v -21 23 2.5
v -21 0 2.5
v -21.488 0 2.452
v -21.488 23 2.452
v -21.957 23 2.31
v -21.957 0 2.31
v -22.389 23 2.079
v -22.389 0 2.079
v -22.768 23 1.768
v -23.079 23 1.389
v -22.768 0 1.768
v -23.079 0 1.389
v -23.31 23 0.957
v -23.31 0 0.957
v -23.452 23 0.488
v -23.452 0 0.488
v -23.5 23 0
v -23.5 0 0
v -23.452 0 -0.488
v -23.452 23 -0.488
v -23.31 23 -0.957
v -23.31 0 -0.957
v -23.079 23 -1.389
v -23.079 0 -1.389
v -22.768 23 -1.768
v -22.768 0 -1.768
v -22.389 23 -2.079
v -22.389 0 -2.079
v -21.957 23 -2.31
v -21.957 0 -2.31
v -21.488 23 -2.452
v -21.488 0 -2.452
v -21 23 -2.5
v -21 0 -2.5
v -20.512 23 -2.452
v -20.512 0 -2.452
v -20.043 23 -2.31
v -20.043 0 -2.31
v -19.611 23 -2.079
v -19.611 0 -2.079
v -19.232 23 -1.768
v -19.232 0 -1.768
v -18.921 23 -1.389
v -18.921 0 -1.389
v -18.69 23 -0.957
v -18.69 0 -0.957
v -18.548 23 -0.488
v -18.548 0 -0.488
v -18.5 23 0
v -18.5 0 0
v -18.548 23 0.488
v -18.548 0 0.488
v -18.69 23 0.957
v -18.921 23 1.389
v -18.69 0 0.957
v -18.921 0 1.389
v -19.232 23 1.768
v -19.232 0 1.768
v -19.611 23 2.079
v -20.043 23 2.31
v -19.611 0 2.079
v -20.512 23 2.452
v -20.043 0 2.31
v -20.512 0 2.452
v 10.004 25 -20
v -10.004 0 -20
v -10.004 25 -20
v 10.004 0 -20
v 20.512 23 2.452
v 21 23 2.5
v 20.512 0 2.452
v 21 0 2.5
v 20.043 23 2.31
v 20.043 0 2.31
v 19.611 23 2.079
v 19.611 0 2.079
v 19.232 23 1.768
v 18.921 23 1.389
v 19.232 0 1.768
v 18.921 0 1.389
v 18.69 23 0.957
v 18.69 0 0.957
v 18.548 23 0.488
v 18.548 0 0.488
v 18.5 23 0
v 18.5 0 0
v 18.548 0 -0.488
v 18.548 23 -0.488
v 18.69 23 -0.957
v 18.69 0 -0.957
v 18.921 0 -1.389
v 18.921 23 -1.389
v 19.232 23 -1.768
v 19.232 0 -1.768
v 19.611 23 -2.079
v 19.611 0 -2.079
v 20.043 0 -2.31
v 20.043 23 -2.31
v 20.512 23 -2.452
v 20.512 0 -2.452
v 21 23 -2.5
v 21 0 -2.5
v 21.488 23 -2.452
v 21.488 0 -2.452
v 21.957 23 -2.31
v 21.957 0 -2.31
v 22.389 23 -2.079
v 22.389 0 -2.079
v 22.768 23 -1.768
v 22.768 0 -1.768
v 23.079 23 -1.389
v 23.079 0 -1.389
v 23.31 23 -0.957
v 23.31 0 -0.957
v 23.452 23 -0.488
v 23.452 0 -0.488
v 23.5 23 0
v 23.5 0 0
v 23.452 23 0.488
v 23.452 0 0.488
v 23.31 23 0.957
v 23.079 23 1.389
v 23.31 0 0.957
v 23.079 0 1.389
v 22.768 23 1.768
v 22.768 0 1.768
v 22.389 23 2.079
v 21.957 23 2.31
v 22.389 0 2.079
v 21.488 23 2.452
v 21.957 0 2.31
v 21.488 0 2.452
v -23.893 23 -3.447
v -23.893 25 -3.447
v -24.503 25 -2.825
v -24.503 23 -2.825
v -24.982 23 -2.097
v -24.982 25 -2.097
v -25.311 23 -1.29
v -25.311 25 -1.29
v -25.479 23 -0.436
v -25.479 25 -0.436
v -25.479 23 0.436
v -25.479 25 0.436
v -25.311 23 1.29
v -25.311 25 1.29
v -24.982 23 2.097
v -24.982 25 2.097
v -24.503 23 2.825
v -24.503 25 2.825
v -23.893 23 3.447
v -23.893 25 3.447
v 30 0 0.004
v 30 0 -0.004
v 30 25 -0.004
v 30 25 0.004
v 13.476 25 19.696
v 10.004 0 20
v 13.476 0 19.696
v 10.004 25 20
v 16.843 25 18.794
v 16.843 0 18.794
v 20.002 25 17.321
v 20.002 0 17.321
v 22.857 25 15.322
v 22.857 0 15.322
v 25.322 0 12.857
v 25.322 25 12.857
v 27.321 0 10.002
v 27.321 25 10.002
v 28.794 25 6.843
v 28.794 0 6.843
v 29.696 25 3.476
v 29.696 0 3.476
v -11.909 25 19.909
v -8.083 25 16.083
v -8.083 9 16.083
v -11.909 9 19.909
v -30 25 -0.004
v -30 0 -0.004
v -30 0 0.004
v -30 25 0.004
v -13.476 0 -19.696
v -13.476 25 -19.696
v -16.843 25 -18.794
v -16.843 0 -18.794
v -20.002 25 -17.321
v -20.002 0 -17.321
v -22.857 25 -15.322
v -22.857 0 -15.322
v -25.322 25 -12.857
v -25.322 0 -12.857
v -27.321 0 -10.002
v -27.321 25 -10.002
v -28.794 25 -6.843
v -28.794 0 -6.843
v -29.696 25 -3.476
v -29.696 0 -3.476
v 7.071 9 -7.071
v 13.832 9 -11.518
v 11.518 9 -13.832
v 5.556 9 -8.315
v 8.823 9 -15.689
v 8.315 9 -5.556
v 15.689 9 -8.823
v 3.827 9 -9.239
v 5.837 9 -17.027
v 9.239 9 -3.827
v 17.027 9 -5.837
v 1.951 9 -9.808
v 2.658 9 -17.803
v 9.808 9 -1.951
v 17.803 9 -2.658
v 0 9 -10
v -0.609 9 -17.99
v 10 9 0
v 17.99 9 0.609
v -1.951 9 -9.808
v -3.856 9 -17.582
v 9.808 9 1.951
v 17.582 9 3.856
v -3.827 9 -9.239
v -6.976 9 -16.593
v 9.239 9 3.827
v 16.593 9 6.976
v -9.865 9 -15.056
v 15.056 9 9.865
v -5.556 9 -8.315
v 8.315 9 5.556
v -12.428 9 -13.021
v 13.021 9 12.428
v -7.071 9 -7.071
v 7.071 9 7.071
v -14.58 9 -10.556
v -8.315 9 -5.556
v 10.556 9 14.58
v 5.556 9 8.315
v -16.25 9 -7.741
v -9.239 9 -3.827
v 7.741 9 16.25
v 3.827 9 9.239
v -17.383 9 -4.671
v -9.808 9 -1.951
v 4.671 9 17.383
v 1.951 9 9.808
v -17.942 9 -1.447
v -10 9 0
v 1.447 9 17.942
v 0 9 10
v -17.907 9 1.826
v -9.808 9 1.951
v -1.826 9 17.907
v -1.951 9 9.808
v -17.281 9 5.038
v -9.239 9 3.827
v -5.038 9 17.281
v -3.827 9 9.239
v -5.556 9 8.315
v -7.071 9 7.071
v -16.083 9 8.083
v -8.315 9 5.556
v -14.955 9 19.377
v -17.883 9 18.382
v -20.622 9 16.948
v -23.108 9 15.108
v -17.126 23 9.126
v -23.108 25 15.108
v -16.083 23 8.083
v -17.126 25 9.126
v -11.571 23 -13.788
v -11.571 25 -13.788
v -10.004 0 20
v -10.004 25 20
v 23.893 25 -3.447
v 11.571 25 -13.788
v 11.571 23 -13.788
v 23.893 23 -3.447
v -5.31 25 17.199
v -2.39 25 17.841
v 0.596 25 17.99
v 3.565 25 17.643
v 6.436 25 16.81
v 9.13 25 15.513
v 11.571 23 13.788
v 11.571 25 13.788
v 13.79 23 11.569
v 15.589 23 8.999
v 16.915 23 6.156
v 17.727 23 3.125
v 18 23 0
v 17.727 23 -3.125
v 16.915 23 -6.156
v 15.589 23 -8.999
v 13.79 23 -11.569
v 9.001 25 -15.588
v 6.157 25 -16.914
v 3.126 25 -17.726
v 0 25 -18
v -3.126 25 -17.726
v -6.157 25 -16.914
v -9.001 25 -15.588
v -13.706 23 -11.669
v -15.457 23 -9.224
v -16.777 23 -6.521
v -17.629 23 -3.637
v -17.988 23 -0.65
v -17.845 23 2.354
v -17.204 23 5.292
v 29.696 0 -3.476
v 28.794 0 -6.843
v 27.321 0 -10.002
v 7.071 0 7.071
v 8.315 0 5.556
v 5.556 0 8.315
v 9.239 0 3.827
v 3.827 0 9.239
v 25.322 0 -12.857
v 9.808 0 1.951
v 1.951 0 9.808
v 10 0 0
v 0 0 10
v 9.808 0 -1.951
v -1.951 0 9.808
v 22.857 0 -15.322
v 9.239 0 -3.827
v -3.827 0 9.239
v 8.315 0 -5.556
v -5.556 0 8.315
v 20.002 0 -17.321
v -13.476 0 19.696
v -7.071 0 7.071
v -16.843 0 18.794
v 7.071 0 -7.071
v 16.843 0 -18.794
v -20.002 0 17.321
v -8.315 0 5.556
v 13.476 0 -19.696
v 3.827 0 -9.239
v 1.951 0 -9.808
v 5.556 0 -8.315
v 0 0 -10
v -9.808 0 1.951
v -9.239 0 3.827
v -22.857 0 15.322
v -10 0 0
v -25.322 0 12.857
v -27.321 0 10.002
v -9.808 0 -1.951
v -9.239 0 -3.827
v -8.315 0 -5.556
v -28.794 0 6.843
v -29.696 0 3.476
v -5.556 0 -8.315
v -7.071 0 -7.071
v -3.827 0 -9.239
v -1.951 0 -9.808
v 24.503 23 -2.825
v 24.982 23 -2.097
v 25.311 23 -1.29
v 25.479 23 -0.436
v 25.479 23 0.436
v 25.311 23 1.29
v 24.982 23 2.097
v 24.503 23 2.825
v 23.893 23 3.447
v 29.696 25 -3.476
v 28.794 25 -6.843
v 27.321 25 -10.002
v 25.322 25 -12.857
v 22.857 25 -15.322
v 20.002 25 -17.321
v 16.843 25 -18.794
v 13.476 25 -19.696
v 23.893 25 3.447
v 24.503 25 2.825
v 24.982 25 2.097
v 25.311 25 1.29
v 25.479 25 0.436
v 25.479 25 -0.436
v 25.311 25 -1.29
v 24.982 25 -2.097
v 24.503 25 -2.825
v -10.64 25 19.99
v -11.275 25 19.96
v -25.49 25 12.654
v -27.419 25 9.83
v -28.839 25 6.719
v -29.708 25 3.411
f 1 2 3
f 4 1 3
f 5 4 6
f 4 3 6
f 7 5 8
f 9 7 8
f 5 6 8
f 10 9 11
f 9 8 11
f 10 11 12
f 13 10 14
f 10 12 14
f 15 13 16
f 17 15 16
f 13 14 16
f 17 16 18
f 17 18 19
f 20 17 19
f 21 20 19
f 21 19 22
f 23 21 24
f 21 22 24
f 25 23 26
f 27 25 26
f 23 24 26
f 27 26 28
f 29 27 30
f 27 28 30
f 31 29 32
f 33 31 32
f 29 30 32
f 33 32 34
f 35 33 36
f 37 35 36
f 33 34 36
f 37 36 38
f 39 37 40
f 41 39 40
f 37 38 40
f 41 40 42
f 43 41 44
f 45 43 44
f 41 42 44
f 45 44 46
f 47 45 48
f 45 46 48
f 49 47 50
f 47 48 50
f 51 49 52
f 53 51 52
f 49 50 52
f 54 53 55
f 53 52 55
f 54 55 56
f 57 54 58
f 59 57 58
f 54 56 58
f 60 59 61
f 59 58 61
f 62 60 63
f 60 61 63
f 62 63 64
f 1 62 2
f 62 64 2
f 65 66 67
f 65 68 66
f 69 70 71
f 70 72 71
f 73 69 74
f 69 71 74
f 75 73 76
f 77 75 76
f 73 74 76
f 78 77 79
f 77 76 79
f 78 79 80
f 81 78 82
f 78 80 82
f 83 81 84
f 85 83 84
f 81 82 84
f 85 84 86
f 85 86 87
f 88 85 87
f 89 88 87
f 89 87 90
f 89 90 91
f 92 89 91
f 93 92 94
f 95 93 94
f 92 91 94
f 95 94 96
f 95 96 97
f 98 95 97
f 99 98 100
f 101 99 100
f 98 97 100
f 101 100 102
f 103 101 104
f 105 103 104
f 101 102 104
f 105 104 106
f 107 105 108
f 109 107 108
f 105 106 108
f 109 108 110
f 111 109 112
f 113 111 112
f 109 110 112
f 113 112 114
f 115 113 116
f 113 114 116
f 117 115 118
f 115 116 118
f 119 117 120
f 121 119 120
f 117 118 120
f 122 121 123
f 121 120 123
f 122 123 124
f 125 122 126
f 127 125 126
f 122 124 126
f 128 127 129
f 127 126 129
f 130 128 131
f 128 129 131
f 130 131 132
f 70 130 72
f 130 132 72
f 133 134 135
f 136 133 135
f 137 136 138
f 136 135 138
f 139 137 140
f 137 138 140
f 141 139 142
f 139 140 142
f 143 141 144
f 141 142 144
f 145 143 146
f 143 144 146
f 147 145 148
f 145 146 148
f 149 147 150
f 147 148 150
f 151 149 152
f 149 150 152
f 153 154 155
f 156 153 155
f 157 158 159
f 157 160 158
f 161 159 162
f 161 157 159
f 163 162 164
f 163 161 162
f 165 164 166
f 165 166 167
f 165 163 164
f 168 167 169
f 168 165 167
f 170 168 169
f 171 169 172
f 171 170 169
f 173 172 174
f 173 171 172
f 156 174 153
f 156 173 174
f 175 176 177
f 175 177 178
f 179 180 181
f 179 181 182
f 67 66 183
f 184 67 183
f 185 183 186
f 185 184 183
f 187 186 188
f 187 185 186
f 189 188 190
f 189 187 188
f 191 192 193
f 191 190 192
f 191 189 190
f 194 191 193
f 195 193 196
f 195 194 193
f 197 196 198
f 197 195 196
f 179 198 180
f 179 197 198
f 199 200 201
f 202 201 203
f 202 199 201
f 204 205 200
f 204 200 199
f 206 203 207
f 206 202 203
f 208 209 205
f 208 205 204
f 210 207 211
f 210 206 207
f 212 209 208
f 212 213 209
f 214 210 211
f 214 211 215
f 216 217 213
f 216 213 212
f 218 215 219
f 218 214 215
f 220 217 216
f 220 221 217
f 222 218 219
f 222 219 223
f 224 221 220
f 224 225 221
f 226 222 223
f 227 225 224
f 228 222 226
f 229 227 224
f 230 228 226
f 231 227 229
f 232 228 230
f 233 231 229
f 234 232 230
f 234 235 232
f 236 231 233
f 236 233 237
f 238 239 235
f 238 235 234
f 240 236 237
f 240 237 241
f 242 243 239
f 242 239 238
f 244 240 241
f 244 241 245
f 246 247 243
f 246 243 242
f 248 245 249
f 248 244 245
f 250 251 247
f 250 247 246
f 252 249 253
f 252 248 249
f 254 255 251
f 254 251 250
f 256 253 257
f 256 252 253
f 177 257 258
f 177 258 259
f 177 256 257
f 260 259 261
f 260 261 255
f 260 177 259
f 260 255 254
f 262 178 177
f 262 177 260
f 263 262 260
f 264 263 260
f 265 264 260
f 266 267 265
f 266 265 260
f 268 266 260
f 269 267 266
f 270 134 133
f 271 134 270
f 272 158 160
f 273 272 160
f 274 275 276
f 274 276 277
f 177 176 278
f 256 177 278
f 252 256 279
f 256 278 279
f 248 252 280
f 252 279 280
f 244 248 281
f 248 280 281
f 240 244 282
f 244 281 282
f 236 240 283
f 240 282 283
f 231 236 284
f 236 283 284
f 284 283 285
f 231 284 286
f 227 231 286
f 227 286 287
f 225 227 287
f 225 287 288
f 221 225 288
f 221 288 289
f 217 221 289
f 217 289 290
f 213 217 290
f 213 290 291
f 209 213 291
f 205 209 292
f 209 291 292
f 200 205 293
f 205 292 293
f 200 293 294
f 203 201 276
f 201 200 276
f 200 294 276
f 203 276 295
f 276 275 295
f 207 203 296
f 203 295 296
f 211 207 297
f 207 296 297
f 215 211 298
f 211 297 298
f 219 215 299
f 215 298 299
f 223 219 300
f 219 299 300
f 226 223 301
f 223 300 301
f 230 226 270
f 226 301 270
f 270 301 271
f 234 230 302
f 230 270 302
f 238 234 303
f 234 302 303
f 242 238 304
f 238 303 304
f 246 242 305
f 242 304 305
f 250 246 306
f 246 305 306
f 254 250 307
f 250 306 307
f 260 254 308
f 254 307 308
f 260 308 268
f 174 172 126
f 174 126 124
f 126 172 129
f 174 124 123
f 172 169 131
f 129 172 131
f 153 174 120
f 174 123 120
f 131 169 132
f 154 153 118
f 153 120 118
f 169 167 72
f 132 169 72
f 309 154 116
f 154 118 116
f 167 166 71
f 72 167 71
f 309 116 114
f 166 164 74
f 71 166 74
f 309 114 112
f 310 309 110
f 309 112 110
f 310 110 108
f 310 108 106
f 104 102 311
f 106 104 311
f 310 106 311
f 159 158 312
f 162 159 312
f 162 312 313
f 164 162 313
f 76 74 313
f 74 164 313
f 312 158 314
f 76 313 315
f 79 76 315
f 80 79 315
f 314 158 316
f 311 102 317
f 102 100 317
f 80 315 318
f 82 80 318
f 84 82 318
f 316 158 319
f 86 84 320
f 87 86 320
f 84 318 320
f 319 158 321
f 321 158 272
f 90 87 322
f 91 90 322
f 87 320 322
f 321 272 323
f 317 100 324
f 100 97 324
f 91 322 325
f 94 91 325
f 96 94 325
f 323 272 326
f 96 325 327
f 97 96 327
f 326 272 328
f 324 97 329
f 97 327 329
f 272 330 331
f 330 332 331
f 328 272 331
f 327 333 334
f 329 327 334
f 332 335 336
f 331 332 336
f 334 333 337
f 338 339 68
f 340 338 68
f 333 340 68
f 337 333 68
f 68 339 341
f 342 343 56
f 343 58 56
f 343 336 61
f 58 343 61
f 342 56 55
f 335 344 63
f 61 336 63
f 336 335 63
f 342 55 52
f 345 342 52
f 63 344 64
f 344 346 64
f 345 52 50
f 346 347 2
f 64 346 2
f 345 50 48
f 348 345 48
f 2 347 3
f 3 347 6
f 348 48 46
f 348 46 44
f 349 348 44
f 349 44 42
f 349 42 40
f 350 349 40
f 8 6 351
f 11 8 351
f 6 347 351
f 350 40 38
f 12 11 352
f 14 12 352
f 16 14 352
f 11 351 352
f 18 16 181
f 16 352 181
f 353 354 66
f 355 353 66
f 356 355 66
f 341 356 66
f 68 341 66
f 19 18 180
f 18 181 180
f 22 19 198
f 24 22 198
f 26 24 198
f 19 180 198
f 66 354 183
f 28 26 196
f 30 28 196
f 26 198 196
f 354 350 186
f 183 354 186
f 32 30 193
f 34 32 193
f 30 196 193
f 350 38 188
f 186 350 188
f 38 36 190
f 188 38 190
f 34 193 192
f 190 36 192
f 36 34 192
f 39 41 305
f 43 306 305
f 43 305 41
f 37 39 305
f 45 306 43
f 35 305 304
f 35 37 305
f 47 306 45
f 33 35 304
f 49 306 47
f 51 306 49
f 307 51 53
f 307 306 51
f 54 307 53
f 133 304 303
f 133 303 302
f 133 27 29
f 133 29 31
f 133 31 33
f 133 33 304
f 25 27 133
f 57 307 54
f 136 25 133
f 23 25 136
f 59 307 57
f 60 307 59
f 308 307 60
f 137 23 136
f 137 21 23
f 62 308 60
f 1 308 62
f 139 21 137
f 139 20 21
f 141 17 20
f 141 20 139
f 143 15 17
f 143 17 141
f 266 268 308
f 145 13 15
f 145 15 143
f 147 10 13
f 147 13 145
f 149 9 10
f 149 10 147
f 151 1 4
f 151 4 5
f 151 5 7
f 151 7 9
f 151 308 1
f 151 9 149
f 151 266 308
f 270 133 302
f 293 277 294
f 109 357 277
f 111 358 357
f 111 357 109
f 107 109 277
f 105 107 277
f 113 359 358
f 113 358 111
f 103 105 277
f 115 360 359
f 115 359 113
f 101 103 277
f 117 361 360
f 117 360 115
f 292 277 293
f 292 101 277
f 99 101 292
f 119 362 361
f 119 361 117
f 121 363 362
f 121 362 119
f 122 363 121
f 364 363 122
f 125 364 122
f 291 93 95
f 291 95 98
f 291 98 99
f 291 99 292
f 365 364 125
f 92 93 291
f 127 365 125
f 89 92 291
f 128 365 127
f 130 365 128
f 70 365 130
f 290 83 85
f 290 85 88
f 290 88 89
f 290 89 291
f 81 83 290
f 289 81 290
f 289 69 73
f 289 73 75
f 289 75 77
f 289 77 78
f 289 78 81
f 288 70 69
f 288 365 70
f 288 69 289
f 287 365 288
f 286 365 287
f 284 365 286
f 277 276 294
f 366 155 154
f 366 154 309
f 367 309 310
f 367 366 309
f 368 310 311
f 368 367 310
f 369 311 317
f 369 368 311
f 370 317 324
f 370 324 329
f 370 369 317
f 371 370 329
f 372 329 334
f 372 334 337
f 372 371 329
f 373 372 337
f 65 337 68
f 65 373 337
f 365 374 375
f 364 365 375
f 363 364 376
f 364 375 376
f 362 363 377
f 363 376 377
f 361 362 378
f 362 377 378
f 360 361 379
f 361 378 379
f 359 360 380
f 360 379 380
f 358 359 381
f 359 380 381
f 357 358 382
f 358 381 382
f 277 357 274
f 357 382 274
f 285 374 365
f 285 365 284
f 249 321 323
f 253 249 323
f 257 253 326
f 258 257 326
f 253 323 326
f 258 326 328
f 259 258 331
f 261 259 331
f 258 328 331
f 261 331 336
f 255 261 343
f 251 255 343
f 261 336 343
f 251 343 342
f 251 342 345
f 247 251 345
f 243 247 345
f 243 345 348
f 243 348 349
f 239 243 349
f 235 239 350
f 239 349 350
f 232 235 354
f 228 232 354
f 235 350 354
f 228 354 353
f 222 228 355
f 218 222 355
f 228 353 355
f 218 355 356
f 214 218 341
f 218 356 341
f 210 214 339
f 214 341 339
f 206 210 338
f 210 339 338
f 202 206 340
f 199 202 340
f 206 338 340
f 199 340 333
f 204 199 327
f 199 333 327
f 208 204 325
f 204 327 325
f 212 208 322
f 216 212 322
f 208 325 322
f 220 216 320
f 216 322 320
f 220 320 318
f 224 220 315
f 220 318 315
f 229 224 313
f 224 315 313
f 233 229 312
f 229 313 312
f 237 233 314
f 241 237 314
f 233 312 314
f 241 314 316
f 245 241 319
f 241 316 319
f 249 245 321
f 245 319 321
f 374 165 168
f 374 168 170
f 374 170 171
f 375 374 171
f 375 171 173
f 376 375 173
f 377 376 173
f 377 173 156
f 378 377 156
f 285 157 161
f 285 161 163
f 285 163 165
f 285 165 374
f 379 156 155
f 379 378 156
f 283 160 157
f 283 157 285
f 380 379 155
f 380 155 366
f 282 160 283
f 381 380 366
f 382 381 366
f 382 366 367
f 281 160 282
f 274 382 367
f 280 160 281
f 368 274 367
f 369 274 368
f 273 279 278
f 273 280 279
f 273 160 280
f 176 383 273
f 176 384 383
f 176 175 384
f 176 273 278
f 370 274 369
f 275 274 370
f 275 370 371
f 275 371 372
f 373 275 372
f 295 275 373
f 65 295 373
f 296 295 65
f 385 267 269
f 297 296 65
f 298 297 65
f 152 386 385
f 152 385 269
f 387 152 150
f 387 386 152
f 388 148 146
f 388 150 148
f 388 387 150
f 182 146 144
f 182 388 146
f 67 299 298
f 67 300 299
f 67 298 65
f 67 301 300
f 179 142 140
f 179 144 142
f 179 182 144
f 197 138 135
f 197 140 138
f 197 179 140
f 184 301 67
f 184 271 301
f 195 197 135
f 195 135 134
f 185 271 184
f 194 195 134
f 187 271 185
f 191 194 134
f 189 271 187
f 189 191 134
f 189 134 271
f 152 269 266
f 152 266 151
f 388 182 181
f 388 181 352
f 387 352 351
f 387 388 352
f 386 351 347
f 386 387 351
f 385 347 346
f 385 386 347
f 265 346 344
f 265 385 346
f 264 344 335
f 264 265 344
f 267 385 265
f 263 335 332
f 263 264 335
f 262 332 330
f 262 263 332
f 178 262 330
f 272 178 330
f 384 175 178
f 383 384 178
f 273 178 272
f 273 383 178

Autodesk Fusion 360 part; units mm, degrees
box "BoxPrimitive1" add length 40 width 60 height 25 placed x (0, 0, -1) y (-1, 0, 0) z (0, 1, 0) at (30, 0, 20)
cylinder "CylinderPrimitive1" cut diameter 36 height -16 placed x (1, 0, 0) y (0, 0, -1) z (0, 1, 0) at (0, 25, 0)
hole "Hole1" at (0, 9, 0) direction (0, -1, 0) diameter 20 depth 17 tip angle 118
sketch "Sketch4" plane through (0, 25, 0) normal (0, 1, 0) x (-1, 0, 0)
  circle A0 centre (0, 0) radius 18
  line L0 (-30, -20) -> (30, -20)
  line L1 (30, -20) -> (30, 20)
  line L2 (30, 20) -> (-30, 20)
  line L3 (-30, 20) -> (-30, -20)
  arc A1 (23.8929, -3.4469) -> (23.8929, 3.4469) centre (21, 0) ccw
  arc A2 (-23.8929, 3.4469) -> (-23.8929, -3.4469) centre (-21, 0) ccw
  arc A3 (-11.5714, -13.7877) -> (11.5714, -13.7877) centre (0, 0) ccw
  arc A4 (11.5714, 13.7877) -> (-11.5714, 13.7877) centre (0, 0) ccw
  line L4 (23.8929, -3.4469) -> (11.5714, -13.7877)
  line L5 (-11.5714, -13.7877) -> (-23.8929, -3.4469)
  line L6 (-23.8929, 3.4469) -> (-11.5714, 13.7877)
  line L7 (11.5714, 13.7877) -> (23.8929, 3.4469)
  dimension "d11" = 4.5
  dimension "d12" = 4.5
  dimension "d13" = 21
  dimension "d14" = 21
extrude "Extrude1" cut sketch "Sketch4" against normal blind 2 contours A0 A1 L4 L7 | A0 A2 L5 L6
hole "Hole2" at (-21, 23, 0) direction (0, -1, 0) diameter 5 end through all
hole "Hole3" at (21, 23, 0) direction (0, -1, 0) diameter 5 end through all
fillet "Fillet1" radius 20 1 edges at (-30, 12.5, 20)
fillet "Fillet1" radius 20 3 edges at (30, 12.5, 20) (30, 12.5, -20) (-30, 12.5, -20)
sketch "Sketch5" plane through (0, 25, 0) normal (0, 1, 0) x (-1, 0, 0)
  arc A0 (10, -20) -> (10, 20) centre (10, 0) ccw
  line L0 (10, 20) -> (-10, 20)
  arc A1 (-10, 20) -> (-10, -20) centre (-10, 0) ccw
  line L1 (-10, -20) -> (10, -20)
  line L2 (23.8929, -3.4469) -> (11.5714, -13.7877)
  arc A2 (-11.5714, -13.7877) -> (11.5714, -13.7877) centre (0, 0) ccw
  line L3 (-11.5714, -13.7877) -> (-23.8929, -3.4469)
  arc A3 (-23.8929, 3.4469) -> (-23.8929, -3.4469) centre (-21, 0) ccw
  line L4 (-23.8929, 3.4469) -> (-11.5714, 13.7877)
  arc A4 (11.5714, 13.7877) -> (-11.5714, 13.7877) centre (0, 0) ccw
  line L5 (11.5714, 13.7877) -> (23.8929, 3.4469)
  arc A5 (23.8929, -3.4469) -> (23.8929, 3.4469) centre (21, 0) ccw
  line L6 (8, 0) -> (0, 8)
  line L7 (0, 8) -> (20.2173, 28.2173)
  line L8 (20.2173, 28.2173) -> (28.2173, 20.2173)
  line L9 (28.2173, 20.2173) -> (8, 0)
  dimension "d25" = 8
  dimension "d26" = 8
extrude "Extrude2" cut sketch "Sketch5" against normal blind 16 contours A0 A4 L5 L7 L9 | A0 L7 L8 L9 | A4 L5 L6 L7 L9
equation "d13 = ( 42 / 2 ) * 1 mm"
equation "d14 = ( 42 / 2 ) * 1 mm"
